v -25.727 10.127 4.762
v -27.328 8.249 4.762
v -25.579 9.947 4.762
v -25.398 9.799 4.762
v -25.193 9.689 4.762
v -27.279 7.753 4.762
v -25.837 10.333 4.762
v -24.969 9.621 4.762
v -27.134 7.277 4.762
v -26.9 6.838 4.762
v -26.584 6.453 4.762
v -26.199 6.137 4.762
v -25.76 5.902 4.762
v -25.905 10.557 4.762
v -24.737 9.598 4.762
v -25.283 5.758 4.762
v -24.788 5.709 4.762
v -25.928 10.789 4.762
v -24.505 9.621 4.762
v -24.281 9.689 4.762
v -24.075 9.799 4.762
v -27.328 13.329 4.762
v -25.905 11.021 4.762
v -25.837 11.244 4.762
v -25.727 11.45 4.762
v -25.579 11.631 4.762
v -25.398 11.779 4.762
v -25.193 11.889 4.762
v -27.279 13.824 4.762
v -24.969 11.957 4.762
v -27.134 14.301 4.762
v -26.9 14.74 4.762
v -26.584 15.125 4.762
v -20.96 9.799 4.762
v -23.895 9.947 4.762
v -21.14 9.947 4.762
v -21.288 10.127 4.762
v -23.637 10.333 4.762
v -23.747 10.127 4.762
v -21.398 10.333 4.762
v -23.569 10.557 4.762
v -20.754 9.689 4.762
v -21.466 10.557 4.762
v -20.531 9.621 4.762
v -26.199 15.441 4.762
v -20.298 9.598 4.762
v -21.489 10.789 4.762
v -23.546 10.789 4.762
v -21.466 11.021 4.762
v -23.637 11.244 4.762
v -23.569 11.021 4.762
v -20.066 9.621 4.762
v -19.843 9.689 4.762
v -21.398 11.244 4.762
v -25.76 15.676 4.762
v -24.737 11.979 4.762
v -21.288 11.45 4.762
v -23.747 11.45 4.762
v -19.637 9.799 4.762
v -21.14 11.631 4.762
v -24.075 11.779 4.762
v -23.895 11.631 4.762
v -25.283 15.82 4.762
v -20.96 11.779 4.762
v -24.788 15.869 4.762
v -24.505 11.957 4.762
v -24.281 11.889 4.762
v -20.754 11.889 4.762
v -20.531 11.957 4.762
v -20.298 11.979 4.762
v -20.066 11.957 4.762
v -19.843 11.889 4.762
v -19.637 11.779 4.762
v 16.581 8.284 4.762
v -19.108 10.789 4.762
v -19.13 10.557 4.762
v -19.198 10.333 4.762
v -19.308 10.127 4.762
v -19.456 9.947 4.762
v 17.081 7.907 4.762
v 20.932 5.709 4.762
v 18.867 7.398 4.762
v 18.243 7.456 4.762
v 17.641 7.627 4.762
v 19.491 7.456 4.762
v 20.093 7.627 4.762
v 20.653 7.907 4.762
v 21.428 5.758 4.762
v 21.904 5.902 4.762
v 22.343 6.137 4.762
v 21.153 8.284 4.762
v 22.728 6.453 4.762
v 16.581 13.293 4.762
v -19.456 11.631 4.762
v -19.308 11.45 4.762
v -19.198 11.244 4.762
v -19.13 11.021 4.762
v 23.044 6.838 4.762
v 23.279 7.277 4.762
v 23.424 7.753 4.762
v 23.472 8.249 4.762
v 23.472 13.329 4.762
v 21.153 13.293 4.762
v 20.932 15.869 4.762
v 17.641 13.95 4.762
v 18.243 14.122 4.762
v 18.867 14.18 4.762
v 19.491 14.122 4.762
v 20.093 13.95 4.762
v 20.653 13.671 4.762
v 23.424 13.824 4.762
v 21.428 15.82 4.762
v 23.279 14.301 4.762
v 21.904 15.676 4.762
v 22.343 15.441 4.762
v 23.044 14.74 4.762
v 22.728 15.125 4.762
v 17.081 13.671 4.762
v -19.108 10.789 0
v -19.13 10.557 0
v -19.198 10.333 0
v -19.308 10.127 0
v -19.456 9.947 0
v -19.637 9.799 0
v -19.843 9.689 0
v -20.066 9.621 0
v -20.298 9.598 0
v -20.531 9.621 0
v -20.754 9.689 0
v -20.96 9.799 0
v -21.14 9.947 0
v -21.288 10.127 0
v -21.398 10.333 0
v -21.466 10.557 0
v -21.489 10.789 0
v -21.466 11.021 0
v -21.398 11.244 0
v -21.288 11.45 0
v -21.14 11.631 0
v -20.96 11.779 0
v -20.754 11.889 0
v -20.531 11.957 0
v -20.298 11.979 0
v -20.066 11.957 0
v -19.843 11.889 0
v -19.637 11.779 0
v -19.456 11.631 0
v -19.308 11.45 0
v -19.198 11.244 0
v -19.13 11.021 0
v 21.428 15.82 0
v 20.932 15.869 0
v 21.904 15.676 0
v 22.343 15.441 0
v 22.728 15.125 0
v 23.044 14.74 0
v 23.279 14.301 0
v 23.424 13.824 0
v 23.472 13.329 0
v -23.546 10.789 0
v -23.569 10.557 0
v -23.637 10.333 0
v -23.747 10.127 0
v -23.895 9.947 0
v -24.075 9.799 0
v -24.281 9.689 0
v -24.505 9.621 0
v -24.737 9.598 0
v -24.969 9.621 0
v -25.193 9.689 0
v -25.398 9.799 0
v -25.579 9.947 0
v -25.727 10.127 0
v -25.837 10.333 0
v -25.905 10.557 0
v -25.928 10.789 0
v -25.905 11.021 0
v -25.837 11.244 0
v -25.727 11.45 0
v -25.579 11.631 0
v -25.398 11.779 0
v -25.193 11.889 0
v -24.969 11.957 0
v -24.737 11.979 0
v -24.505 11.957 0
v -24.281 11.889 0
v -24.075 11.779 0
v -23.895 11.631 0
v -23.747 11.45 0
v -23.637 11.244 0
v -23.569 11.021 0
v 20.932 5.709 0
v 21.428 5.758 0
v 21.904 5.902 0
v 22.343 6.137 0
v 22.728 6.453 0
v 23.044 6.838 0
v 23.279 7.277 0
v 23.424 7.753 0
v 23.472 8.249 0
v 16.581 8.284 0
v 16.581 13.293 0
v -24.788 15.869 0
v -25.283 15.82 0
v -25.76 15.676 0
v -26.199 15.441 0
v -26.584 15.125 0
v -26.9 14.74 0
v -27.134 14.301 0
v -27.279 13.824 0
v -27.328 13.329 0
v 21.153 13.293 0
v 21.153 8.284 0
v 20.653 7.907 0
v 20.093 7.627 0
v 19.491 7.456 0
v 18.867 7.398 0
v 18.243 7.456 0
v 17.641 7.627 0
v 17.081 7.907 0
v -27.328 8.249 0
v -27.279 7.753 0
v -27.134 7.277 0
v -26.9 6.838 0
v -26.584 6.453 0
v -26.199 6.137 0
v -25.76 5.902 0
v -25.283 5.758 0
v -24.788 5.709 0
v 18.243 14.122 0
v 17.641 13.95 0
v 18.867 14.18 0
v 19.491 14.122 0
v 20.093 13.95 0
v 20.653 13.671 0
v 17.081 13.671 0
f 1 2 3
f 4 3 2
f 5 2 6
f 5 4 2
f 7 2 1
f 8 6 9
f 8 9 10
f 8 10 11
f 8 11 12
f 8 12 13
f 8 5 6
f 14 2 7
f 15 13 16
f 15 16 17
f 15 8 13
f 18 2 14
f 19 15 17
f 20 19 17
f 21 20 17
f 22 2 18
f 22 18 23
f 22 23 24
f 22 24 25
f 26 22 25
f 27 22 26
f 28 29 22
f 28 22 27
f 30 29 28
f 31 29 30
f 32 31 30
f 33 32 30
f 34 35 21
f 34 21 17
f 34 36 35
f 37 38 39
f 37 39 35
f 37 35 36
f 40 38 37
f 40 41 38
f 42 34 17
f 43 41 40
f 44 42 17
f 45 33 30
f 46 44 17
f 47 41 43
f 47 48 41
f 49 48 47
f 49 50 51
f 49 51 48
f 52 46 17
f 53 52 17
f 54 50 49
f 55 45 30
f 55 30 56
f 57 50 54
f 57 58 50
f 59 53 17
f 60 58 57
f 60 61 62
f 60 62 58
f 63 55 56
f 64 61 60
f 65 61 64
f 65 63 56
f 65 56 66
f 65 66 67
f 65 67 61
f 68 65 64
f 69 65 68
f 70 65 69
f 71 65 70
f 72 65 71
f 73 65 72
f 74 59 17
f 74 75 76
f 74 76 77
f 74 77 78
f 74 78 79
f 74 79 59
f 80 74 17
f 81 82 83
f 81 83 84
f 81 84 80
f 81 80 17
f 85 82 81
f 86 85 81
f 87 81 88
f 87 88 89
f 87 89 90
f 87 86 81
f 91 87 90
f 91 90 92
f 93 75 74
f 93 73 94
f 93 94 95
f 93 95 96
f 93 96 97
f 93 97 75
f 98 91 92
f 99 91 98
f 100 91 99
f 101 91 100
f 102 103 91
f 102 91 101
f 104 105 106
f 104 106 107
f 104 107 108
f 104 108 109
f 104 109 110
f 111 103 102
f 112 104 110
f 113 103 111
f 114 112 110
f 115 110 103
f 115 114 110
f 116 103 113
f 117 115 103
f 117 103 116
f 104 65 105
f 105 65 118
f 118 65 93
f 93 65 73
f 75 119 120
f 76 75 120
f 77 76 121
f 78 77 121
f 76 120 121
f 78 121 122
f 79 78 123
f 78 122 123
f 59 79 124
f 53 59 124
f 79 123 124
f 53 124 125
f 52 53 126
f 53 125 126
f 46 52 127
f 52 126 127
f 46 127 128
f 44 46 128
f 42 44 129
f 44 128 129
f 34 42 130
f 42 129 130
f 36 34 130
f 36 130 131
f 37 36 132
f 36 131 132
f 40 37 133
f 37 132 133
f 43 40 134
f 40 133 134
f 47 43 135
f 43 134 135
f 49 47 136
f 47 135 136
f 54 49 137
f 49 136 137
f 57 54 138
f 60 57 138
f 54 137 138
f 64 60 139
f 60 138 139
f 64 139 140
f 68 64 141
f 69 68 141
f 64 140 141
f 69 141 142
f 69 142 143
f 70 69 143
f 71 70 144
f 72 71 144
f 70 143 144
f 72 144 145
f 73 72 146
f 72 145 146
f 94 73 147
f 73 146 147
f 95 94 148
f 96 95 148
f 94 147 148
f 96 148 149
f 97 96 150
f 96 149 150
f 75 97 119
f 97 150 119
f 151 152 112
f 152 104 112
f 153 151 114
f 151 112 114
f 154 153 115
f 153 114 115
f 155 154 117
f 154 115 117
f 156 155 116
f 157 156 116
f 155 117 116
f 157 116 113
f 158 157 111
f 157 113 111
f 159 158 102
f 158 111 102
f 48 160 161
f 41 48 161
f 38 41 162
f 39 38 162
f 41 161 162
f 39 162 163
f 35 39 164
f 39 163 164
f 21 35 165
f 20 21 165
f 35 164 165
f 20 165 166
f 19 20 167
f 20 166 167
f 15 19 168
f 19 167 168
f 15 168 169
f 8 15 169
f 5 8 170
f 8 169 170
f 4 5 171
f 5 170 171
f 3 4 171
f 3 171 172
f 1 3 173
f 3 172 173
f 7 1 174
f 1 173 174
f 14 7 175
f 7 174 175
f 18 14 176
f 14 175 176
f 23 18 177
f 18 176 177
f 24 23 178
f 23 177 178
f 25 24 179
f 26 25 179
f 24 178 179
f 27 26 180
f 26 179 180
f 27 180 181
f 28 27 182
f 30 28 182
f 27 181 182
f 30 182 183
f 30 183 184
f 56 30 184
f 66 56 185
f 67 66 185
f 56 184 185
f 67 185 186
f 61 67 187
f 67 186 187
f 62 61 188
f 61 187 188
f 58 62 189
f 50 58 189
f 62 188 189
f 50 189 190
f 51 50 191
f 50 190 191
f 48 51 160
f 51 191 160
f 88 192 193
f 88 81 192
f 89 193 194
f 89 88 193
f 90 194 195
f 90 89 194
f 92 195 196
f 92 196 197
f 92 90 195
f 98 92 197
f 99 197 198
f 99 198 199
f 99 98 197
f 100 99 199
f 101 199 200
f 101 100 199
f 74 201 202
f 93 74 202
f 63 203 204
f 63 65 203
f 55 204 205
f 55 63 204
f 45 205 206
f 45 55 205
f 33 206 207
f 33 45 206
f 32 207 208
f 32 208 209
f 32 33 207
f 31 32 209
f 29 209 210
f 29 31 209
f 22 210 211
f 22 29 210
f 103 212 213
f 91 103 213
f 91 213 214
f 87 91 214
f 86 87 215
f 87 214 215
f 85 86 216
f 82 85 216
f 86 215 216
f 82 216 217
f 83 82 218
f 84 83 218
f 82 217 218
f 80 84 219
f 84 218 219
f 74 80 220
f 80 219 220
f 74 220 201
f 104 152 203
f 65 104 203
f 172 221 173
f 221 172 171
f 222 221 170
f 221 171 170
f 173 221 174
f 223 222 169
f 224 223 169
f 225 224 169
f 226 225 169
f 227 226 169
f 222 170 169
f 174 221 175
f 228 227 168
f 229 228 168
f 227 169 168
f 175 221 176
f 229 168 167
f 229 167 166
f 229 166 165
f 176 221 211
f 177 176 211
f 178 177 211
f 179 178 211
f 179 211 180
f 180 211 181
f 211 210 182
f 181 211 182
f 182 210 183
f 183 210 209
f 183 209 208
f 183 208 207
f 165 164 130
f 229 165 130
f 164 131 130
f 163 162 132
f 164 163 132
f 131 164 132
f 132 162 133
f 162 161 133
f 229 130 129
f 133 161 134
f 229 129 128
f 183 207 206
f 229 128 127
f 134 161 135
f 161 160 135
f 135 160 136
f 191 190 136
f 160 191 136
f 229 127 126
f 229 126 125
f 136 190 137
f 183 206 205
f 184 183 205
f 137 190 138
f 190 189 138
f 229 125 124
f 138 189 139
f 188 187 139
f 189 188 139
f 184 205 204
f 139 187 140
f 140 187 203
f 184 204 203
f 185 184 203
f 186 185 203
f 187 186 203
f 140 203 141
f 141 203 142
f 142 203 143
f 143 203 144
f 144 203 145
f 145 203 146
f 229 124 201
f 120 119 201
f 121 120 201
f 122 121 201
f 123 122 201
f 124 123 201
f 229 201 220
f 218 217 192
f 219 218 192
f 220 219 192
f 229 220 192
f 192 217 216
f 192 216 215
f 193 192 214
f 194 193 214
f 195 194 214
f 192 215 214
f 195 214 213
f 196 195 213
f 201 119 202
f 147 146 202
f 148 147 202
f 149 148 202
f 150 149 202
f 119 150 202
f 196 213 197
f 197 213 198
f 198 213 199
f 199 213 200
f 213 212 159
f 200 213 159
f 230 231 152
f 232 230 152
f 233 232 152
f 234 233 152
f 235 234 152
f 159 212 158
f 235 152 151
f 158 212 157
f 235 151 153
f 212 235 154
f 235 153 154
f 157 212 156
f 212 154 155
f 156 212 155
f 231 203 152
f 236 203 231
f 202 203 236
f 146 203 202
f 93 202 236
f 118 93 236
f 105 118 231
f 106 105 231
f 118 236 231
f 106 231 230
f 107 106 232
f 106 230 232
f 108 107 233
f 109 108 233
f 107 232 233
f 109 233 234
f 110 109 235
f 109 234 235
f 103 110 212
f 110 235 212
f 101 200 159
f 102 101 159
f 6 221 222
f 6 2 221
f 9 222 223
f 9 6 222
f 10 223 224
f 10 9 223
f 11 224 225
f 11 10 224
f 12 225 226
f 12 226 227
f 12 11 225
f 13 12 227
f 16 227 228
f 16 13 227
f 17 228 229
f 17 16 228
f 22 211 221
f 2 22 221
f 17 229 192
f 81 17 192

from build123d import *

# Parameters (mm, degrees)
F1_DEPTH = 4.7625
F2_R     = 2.54


# Not quite as in the source:
# - a length typed as a fraction of an inch, garbled in the dataset ("3 / 203.2 mm" for 3/8 in), is restored


with BuildPart() as f1:
    # F0 (on Top) → F1 (new body)
    with BuildSketch(Plane.XY):
        with BuildLine():
            Line((23.4723398992, 10.7888607308), (23.4723398992, 15.8688607308))
            Line((23.4723398992, 15.8688607308), (-27.3276601008, 15.8688607308))
            Line((-27.3276601008, 15.8688607308), (-27.3276601008, 10.7888607308))
            Line((-27.3276601008, 10.7888607308), (-25.9275856725, 10.7888607308))
            ThreePointArc((-25.9275856725, 10.7888607308), (-24.7369606725, 11.9794857308), (-23.5463356725, 10.7888607308))
            Line((-23.5463356725, 10.7888607308), (-21.4888538531, 10.7888607308))
            ThreePointArc((-21.4888538531, 10.7888607308), (-20.2982288531, 11.9794857308), (-19.1076038531, 10.7888607308))
            Line((-19.1076038531, 10.7888607308), (15.4761500436, 10.7888607308))
            ThreePointArc((15.4761500436, 10.7888607308), (15.7646477316, 12.1575472198), (16.5810500436, 13.2933380835))
            ThreePointArc((16.5810500436, 13.2933380835), (18.8670500436, 14.1797607308), (21.1530500436, 13.2933380835))
            ThreePointArc((21.1530500436, 13.2933380835), (21.9694523555, 12.1575472198), (22.2579500436, 10.7888607308))
            Line((22.2579500436, 10.7888607308), (23.4723398992, 10.7888607308))
        make_face()
        with BuildLine():
            Line((23.4723398992, 5.7088607308), (23.4723398992, 10.7888607308))
            Line((23.4723398992, 10.7888607308), (22.2579500436, 10.7888607308))
            ThreePointArc((22.2579500436, 10.7888607308), (21.9694523555, 9.4201742419), (21.1530500436, 8.2843833782))
            ThreePointArc((21.1530500436, 8.2843833782), (18.8670500436, 7.3979607308), (16.5810500436, 8.2843833782))
            ThreePointArc((16.5810500436, 8.2843833782), (15.7646477316, 9.4201742419), (15.4761500436, 10.7888607308))
            Line((15.4761500436, 10.7888607308), (-19.1076038531, 10.7888607308))
            ThreePointArc((-19.1076038531, 10.7888607308), (-20.2982288531, 9.5982357308), (-21.4888538531, 10.7888607308))
            Line((-21.4888538531, 10.7888607308), (-23.5463356725, 10.7888607308))
            ThreePointArc((-23.5463356725, 10.7888607308), (-24.7369606725, 9.5982357308), (-25.9275856725, 10.7888607308))
            Line((-25.9275856725, 10.7888607308), (-27.3276601008, 10.7888607308))
            Line((-27.3276601008, 10.7888607308), (-27.3276601008, 5.7088607308))
            Line((-27.3276601008, 5.7088607308), (23.4723398992, 5.7088607308))
        make_face()
        with BuildLine():
            Line((16.5810500436, 8.2843833782), (16.5810500436, 10.7888607308))
            Line((16.5810500436, 10.7888607308), (15.4761500436, 10.7888607308))
            ThreePointArc((15.4761500436, 10.7888607308), (15.7646477316, 9.4201742419), (16.5810500436, 8.2843833782))
        make_face()
        with BuildLine():
            Line((15.4761500436, 10.7888607308), (16.5810500436, 10.7888607308))
            Line((16.5810500436, 10.7888607308), (16.5810500436, 13.2933380835))
            ThreePointArc((16.5810500436, 13.2933380835), (15.7646477316, 12.1575472198), (15.4761500436, 10.7888607308))
        make_face()
        with BuildLine():
            Line((21.1530500436, 10.7888607308), (22.2579500436, 10.7888607308))
            ThreePointArc((22.2579500436, 10.7888607308), (21.9694523555, 12.1575472198), (21.1530500436, 13.2933380835))
            Line((21.1530500436, 13.2933380835), (21.1530500436, 10.7888607308))
        make_face()
        with BuildLine():
            ThreePointArc((21.1530500436, 8.2843833782), (21.9694523555, 9.4201742419), (22.2579500436, 10.7888607308))
            Line((22.2579500436, 10.7888607308), (21.1530500436, 10.7888607308))
            Line((21.1530500436, 10.7888607308), (21.1530500436, 8.2843833782))
        make_face()
    extrude(amount=F1_DEPTH)

    # F2
    f2_edges = [f1.edges().sort_by_distance(p)[0] for p in [
        (23.47234, 15.868861, 2.38125),
        (-27.32766, 15.868861, 2.38125),
        (-27.32766, 5.708861, 2.38125),
        (23.47234, 5.708861, 2.38125),
    ]]
    fillet(f2_edges, radius=F2_R)


solid = f1.part
